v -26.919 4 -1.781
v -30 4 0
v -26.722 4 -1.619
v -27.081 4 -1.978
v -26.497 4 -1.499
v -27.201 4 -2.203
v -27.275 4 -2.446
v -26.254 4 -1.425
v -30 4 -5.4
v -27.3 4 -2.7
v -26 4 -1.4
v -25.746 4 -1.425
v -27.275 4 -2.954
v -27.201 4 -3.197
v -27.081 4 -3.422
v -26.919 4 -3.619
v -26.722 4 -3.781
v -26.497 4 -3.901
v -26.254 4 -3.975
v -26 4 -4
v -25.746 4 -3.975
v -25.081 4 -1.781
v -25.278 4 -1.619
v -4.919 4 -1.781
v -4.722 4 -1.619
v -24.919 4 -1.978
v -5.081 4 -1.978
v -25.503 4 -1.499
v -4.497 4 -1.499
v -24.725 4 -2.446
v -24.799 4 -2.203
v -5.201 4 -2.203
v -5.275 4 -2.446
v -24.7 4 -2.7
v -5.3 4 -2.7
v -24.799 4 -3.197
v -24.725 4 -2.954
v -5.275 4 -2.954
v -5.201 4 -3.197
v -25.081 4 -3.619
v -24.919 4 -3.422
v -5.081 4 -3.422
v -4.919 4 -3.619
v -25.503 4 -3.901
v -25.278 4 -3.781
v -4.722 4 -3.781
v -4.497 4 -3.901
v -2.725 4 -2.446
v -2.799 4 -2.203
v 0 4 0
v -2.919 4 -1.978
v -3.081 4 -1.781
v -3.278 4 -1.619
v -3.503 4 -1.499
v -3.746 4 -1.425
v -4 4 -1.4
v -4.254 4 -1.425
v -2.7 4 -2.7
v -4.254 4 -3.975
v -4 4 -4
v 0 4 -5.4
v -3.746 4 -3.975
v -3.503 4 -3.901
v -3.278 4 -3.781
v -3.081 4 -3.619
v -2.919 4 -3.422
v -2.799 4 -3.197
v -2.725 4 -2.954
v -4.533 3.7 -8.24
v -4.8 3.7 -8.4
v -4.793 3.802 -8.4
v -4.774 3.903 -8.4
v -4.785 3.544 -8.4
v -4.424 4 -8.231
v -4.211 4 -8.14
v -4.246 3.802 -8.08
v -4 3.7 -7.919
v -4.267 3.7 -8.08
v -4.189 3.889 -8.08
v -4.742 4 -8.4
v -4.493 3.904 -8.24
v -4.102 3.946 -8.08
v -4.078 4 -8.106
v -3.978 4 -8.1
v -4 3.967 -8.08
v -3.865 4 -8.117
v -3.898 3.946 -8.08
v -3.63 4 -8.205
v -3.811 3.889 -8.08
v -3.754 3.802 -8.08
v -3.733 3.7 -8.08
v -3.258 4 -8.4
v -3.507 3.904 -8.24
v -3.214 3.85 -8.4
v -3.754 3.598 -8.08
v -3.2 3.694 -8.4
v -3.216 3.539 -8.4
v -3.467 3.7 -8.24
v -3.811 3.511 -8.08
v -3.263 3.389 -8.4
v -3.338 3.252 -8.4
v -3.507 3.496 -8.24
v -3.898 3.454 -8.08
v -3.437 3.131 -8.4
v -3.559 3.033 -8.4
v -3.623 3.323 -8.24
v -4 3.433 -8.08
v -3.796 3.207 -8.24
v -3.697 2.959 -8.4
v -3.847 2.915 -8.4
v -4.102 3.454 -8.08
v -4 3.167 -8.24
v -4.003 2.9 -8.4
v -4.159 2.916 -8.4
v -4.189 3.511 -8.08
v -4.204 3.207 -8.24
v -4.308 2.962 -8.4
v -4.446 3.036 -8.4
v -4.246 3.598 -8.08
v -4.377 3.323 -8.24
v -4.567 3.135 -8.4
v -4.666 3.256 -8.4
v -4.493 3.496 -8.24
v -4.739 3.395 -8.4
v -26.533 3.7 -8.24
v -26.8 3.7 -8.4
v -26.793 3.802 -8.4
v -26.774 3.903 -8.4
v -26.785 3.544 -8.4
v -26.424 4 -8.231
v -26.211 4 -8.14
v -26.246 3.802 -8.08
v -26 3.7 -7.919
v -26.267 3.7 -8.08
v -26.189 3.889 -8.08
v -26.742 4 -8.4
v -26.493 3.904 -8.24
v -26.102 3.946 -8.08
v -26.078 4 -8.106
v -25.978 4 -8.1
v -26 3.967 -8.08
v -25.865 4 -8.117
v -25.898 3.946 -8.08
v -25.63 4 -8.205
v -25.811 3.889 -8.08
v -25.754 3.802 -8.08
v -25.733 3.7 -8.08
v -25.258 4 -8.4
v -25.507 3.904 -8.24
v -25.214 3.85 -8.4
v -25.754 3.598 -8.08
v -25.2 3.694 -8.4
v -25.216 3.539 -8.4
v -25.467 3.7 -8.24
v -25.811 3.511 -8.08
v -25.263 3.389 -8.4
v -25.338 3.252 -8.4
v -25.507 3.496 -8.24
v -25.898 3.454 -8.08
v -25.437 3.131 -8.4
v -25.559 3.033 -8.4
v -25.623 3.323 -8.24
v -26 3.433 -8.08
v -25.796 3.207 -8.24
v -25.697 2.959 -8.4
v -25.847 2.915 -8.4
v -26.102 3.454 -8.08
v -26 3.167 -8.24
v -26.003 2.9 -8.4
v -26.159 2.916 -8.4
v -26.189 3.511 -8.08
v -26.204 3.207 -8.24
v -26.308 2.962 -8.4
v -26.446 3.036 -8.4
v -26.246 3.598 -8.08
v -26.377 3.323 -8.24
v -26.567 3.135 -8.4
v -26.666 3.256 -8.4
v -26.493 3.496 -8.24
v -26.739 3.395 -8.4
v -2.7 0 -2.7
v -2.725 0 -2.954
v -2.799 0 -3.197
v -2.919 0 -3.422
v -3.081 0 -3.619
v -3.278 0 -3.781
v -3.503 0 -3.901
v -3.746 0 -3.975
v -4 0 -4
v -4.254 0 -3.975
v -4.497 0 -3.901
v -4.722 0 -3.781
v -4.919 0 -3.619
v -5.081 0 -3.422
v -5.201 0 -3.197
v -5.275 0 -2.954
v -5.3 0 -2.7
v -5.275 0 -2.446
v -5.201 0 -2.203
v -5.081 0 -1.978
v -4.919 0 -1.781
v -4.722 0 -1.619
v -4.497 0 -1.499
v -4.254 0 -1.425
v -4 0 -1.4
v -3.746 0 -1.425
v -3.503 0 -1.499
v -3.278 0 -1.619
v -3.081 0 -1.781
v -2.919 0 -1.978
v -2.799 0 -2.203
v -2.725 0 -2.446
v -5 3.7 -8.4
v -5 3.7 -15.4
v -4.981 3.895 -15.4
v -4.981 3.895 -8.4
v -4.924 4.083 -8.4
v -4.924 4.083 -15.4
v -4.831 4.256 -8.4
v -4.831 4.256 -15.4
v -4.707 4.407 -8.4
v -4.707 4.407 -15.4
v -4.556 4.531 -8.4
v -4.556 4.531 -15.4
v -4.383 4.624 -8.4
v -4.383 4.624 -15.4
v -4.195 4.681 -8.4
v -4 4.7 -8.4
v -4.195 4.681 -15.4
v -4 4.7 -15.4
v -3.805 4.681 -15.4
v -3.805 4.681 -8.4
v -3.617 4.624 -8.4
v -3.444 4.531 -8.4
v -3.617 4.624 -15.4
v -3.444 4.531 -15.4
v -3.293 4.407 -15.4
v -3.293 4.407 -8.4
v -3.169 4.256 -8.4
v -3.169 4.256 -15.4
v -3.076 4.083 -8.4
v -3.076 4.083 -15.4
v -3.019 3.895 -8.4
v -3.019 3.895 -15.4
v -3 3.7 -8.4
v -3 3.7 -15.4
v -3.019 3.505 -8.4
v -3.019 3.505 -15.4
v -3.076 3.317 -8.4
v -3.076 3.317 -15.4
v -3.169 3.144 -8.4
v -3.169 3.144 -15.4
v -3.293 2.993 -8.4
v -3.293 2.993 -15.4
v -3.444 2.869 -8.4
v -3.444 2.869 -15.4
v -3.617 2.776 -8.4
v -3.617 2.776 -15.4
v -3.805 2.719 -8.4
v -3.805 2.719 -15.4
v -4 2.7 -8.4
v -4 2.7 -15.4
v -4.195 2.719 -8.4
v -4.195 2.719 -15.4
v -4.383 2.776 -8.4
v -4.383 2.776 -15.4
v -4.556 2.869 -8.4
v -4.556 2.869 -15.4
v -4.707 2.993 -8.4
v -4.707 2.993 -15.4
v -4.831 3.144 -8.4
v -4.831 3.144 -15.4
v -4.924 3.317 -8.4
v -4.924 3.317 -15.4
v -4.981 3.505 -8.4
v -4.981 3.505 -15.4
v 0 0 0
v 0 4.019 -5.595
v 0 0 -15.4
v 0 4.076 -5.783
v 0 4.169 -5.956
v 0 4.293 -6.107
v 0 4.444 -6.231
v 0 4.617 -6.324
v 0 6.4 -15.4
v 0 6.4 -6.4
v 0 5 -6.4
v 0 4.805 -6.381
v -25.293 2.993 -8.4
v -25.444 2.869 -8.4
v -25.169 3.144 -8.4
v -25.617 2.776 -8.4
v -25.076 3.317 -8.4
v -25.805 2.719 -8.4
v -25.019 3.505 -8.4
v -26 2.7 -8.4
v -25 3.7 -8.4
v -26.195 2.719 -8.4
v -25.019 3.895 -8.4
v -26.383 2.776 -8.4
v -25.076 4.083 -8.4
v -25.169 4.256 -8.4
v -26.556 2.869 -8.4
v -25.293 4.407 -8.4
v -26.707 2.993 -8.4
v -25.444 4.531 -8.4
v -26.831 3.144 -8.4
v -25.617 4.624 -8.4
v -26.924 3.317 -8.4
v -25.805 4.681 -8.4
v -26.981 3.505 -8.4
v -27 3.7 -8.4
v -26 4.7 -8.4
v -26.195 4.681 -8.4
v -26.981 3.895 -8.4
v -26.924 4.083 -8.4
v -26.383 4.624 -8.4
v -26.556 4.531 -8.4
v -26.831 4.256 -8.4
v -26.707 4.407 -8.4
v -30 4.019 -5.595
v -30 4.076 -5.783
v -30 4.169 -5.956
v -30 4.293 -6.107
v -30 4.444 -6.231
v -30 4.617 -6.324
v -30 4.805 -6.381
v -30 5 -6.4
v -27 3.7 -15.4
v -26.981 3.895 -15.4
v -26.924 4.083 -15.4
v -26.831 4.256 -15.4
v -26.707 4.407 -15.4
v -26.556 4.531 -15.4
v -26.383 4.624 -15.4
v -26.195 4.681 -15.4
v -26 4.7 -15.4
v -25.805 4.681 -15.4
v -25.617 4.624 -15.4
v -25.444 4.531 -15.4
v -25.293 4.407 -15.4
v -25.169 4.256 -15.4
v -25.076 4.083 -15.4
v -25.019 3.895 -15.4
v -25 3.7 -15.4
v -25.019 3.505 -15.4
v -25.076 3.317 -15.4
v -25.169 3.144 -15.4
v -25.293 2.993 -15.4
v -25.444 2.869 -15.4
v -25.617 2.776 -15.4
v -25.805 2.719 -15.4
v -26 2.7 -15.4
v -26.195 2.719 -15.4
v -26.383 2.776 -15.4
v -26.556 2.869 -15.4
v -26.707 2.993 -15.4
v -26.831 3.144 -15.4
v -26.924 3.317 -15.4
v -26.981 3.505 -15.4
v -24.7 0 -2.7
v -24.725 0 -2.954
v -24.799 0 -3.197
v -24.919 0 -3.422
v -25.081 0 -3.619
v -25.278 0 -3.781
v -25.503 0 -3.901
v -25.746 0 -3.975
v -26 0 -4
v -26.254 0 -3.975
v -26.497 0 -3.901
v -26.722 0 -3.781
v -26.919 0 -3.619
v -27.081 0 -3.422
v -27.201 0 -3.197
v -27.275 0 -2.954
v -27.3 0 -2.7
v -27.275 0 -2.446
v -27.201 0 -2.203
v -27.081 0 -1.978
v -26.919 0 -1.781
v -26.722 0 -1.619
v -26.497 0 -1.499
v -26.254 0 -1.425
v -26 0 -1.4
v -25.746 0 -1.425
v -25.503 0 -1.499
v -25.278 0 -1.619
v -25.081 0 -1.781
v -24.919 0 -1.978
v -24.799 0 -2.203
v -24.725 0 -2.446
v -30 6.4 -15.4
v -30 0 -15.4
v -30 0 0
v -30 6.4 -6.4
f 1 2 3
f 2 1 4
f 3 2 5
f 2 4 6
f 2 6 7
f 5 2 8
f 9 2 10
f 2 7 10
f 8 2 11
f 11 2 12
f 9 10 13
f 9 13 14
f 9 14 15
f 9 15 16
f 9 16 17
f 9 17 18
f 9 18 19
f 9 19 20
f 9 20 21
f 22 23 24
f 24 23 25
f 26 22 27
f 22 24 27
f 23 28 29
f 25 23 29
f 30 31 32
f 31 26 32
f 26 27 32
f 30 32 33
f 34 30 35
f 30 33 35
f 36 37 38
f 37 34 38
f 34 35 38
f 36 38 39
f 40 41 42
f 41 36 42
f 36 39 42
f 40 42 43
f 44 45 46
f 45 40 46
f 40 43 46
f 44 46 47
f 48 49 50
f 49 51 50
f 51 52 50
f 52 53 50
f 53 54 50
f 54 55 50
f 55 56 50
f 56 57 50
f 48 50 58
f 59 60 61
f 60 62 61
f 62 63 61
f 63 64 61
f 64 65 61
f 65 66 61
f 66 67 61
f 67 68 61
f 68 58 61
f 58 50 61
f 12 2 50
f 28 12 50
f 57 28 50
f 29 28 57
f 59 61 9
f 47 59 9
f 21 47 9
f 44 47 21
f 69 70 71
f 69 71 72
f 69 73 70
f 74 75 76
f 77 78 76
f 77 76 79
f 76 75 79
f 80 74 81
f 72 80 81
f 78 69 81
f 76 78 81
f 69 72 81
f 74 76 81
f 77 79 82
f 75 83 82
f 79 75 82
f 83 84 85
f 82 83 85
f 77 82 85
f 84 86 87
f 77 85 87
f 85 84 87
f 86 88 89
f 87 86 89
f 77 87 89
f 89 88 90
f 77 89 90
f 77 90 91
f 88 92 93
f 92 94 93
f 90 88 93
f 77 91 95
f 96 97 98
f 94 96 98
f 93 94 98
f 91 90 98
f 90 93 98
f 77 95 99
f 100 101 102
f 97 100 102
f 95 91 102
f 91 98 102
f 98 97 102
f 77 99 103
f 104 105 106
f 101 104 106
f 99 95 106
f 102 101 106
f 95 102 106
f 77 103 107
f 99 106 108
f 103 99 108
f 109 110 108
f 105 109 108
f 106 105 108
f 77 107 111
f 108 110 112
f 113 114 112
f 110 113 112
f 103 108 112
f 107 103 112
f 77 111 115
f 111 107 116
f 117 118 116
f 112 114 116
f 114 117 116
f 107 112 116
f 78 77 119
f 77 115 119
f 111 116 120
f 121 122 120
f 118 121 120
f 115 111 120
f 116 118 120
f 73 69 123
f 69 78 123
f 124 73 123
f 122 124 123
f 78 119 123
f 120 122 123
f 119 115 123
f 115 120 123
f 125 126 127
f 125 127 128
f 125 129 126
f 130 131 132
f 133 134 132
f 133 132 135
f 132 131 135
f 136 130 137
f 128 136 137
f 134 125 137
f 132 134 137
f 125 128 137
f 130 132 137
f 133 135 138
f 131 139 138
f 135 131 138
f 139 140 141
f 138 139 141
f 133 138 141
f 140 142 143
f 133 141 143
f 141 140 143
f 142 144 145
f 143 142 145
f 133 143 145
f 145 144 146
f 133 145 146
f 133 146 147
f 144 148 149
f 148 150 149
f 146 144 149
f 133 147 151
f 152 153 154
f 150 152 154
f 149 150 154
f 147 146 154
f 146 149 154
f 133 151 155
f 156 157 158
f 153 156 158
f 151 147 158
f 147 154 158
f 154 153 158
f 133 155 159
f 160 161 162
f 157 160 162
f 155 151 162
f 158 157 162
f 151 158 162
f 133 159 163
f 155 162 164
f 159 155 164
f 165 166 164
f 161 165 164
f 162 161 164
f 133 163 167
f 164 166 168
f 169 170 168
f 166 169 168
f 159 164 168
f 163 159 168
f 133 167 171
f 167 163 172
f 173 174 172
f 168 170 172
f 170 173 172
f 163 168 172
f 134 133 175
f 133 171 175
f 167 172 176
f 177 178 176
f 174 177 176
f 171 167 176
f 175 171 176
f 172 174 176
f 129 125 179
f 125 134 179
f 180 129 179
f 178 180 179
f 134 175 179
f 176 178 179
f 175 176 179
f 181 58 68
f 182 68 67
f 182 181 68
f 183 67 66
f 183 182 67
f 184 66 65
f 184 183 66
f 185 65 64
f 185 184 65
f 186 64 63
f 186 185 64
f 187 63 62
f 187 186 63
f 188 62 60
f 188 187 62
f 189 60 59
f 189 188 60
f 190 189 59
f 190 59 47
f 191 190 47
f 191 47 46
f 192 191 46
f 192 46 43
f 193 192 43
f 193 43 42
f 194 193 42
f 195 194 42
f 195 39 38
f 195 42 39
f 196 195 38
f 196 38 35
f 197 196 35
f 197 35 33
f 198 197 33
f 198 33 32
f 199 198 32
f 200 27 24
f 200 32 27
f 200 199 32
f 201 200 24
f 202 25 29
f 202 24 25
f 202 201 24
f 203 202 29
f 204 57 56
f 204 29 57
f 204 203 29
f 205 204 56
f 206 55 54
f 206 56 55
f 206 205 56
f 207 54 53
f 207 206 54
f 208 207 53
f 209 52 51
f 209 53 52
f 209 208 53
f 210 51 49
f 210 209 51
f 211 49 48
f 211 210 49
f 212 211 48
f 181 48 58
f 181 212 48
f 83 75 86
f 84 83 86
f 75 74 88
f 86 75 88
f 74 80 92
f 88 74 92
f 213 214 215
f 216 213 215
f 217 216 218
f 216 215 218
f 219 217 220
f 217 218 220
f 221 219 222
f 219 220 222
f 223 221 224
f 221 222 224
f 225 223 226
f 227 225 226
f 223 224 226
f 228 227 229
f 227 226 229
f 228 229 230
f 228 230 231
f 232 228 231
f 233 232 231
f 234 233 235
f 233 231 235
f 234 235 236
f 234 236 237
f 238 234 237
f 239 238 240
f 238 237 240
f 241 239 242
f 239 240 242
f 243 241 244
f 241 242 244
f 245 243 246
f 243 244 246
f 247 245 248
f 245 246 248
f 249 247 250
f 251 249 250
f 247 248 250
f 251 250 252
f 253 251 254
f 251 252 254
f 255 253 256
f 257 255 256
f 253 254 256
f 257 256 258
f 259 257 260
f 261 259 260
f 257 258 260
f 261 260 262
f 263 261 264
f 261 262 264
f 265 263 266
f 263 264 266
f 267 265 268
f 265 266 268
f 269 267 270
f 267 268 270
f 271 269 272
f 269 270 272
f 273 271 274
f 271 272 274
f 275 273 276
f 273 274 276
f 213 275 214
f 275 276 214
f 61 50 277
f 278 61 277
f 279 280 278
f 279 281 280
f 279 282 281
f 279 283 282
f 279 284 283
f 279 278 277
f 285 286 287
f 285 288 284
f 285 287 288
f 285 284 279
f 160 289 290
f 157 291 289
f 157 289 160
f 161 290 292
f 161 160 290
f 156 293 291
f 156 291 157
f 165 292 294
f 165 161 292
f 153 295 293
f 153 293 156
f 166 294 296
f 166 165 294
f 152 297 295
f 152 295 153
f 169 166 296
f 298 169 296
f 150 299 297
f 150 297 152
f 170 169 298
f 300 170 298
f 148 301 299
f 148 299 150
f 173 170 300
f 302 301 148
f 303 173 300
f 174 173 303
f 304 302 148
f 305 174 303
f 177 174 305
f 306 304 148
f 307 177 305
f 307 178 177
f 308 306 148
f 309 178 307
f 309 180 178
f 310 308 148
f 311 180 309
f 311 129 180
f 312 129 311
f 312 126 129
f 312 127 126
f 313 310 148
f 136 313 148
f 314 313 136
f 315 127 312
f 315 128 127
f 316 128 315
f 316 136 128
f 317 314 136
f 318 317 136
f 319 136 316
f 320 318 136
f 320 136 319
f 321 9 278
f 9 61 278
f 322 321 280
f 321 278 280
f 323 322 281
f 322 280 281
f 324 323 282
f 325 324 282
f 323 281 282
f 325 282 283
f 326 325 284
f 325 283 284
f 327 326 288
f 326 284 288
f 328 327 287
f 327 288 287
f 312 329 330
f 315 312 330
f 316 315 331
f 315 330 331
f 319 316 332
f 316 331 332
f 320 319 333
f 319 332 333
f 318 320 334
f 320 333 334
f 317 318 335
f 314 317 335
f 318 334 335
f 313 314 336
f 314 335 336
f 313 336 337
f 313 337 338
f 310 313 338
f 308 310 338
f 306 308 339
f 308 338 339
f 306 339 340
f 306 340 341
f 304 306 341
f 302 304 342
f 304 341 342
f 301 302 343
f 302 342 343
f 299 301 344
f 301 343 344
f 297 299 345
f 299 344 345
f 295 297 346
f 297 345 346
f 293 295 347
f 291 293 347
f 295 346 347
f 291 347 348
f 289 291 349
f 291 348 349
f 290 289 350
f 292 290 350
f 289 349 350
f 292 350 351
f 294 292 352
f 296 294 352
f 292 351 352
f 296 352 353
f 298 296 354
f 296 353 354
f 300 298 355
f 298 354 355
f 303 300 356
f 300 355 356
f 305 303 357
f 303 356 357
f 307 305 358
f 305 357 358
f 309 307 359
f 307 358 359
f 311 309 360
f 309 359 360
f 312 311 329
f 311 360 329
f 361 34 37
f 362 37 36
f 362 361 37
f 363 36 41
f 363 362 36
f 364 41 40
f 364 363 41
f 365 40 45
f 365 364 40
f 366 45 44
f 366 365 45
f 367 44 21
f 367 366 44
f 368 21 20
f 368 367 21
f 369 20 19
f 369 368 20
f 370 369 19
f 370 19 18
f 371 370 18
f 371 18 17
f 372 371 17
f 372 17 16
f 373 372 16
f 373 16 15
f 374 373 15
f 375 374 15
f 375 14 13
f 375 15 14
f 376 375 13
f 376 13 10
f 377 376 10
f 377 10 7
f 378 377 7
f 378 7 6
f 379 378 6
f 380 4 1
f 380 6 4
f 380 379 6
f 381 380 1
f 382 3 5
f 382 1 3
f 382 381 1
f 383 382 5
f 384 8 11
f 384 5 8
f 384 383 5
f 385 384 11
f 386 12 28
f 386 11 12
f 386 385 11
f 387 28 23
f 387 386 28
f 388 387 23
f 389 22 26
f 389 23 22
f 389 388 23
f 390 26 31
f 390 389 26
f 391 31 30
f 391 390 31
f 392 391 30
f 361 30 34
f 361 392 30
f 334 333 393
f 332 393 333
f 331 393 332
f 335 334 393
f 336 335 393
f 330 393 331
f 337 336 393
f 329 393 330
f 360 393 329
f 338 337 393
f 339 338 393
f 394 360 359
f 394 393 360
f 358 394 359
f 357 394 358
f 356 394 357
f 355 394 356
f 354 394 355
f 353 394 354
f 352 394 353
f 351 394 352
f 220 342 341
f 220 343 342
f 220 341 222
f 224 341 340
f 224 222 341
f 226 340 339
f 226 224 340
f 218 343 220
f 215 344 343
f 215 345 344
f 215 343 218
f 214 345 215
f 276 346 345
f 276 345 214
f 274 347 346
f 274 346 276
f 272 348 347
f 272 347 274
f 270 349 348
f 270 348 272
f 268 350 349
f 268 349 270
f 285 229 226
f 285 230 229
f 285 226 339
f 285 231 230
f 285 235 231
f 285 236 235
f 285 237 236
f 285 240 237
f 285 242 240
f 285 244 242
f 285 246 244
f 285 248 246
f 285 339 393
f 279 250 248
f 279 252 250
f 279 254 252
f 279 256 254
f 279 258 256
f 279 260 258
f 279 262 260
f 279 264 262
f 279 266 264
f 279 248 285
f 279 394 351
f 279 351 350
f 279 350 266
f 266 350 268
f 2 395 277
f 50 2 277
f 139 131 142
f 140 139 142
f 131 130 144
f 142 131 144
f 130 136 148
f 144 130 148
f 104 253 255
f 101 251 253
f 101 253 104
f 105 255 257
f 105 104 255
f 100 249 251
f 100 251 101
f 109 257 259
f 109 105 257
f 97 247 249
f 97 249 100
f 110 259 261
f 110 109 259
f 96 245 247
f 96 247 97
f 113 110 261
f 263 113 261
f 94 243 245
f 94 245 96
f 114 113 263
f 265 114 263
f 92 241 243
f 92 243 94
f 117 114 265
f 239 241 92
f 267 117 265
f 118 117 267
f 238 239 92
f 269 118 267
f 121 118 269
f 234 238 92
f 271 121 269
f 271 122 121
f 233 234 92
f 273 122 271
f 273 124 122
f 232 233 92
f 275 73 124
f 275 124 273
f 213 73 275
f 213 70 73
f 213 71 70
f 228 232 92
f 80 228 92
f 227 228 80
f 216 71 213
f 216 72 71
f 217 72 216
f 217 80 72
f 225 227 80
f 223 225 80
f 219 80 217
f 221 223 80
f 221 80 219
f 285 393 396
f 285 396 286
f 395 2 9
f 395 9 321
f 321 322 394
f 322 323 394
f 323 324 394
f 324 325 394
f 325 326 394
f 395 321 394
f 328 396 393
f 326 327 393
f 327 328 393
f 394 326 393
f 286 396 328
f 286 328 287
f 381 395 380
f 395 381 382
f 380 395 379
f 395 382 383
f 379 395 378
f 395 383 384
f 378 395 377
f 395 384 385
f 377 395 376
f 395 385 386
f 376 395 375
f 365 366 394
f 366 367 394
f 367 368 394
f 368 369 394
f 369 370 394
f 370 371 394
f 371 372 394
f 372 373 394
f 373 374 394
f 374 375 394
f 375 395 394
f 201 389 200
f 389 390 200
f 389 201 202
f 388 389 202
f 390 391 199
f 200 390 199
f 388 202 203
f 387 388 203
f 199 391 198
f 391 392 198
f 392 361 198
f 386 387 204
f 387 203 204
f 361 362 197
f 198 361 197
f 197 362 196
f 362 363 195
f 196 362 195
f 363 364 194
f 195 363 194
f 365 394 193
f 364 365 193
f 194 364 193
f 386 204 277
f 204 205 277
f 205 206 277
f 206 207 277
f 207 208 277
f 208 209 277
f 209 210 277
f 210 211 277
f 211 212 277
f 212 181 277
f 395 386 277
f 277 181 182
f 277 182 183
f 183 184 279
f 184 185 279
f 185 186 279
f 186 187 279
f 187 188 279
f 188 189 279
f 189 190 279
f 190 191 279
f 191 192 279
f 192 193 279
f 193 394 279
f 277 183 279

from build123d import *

# Parameters (mm, degrees)
SKETCH1_W                 = 30
SKETCH1_H                 = 15.4
BOSS_EXTRUDE1_DEPTH       = 6.4
SKETCH4_R                 = 1.3
CUT_EXTRUDE3_DEPTH        = 7.4
SKETCH8_W                 = 11.4
SKETCH8_H                 = 2.4
CUT_EXTRUDE4_DEPTH        = 31
SKETCH9_R                 = 0.5
CUT_EXTRUDE5_DEPTH        = 7
M2X0_4_TAPPED_HOLE1_D     = 1.6
M2X0_4_TAPPED_HOLE1_DEPTH = 7
M2X0_4_TAPPED_HOLE1_TIP   = 0.480688495
SKETCH14_W                = 30
SKETCH14_H                = 5
BOSS_EXTRUDE2_DEPTH       = 2.4
SKETCH13_R                = 1
CUT_EXTRUDE6_DEPTH        = 7
FILLET1_R                 = 1


with BuildPart() as part:
    # Sketch1 → Boss-Extrude1 (new body)
    with BuildSketch(Plane(origin=(0, 0, 0), x_dir=(1, 0, 0), z_dir=(0, 1, 0))):
        with Locations((-15, 7.7)):
            Rectangle(SKETCH1_W, SKETCH1_H)
    extrude(amount=BOSS_EXTRUDE1_DEPTH)

    # Sketch4 → Cut-Extrude3 (cut, through all)
    with BuildSketch(Plane(origin=(0, 0, 0), x_dir=(1, 0, 0), z_dir=(0, 1, 0))):
        with Locations((-26, 2.7)):
            Circle(SKETCH4_R)
        with Locations((-4, 2.7)):
            Circle(SKETCH4_R)
    extrude(amount=CUT_EXTRUDE3_DEPTH, mode=Mode.SUBTRACT)

    # Sketch8 → Cut-Extrude4 (cut, through all)
    with BuildSketch(Plane(origin=(0, 0, 0), x_dir=(0, 0, -1), z_dir=(1, 0, 0))):
        with Locations((5.7, 5.2)):
            Rectangle(SKETCH8_W, SKETCH8_H)
    extrude(amount=-CUT_EXTRUDE4_DEPTH, mode=Mode.SUBTRACT)

    # Sketch9 → Cut-Extrude5 (cut)
    with BuildSketch(Plane(origin=(0, 0, -15.4), x_dir=(-1, 0, 0), z_dir=(0, 0, -1))):
        with Locations((4, 3.7)):
            Circle(SKETCH9_R)
        with Locations((26, 3.7)):
            Circle(SKETCH9_R)
    extrude(amount=-CUT_EXTRUDE5_DEPTH, mode=Mode.SUBTRACT)

    # M2x0.4 Tapped Hole1
    with Locations(Plane(origin=(0, 0, -15.4), x_dir=(-1, 0, 0), z_dir=(0, 0, -1))):
        with Locations((4, 3.7), (26, 3.7)):
            Hole(M2X0_4_TAPPED_HOLE1_D / 2, depth=M2X0_4_TAPPED_HOLE1_DEPTH)
            with Locations((0, 0, -(M2X0_4_TAPPED_HOLE1_DEPTH + M2X0_4_TAPPED_HOLE1_TIP / 2))):  # 118° drill point
                Cone(0, M2X0_4_TAPPED_HOLE1_D / 2, M2X0_4_TAPPED_HOLE1_TIP, mode=Mode.SUBTRACT)

    # Sketch14 → Boss-Extrude2 (add)
    with BuildSketch(Plane(origin=(0, 6.4, 0), x_dir=(1, 0, 0), z_dir=(0, 1, 0))):
        with Locations((-15, 8.9)):
            Rectangle(SKETCH14_W, SKETCH14_H)
    extrude(amount=-BOSS_EXTRUDE2_DEPTH)

    # Sketch13 → Cut-Extrude6 (cut)
    with BuildSketch(Plane(origin=(0, 0, -15.4), x_dir=(-1, 0, 0), z_dir=(0, 0, -1))):
        with Locations((4, 3.7)):
            Circle(SKETCH13_R)
        with Locations((26, 3.7)):
            Circle(SKETCH13_R)
    extrude(amount=-CUT_EXTRUDE6_DEPTH, mode=Mode.SUBTRACT)

    # Fillet1
    fillet1_edges = [part.edges().sort_by_distance(p)[0] for p in [
        (-15, 4, -6.4),
    ]]
    fillet(fillet1_edges, radius=FILLET1_R)


solid = part.part
